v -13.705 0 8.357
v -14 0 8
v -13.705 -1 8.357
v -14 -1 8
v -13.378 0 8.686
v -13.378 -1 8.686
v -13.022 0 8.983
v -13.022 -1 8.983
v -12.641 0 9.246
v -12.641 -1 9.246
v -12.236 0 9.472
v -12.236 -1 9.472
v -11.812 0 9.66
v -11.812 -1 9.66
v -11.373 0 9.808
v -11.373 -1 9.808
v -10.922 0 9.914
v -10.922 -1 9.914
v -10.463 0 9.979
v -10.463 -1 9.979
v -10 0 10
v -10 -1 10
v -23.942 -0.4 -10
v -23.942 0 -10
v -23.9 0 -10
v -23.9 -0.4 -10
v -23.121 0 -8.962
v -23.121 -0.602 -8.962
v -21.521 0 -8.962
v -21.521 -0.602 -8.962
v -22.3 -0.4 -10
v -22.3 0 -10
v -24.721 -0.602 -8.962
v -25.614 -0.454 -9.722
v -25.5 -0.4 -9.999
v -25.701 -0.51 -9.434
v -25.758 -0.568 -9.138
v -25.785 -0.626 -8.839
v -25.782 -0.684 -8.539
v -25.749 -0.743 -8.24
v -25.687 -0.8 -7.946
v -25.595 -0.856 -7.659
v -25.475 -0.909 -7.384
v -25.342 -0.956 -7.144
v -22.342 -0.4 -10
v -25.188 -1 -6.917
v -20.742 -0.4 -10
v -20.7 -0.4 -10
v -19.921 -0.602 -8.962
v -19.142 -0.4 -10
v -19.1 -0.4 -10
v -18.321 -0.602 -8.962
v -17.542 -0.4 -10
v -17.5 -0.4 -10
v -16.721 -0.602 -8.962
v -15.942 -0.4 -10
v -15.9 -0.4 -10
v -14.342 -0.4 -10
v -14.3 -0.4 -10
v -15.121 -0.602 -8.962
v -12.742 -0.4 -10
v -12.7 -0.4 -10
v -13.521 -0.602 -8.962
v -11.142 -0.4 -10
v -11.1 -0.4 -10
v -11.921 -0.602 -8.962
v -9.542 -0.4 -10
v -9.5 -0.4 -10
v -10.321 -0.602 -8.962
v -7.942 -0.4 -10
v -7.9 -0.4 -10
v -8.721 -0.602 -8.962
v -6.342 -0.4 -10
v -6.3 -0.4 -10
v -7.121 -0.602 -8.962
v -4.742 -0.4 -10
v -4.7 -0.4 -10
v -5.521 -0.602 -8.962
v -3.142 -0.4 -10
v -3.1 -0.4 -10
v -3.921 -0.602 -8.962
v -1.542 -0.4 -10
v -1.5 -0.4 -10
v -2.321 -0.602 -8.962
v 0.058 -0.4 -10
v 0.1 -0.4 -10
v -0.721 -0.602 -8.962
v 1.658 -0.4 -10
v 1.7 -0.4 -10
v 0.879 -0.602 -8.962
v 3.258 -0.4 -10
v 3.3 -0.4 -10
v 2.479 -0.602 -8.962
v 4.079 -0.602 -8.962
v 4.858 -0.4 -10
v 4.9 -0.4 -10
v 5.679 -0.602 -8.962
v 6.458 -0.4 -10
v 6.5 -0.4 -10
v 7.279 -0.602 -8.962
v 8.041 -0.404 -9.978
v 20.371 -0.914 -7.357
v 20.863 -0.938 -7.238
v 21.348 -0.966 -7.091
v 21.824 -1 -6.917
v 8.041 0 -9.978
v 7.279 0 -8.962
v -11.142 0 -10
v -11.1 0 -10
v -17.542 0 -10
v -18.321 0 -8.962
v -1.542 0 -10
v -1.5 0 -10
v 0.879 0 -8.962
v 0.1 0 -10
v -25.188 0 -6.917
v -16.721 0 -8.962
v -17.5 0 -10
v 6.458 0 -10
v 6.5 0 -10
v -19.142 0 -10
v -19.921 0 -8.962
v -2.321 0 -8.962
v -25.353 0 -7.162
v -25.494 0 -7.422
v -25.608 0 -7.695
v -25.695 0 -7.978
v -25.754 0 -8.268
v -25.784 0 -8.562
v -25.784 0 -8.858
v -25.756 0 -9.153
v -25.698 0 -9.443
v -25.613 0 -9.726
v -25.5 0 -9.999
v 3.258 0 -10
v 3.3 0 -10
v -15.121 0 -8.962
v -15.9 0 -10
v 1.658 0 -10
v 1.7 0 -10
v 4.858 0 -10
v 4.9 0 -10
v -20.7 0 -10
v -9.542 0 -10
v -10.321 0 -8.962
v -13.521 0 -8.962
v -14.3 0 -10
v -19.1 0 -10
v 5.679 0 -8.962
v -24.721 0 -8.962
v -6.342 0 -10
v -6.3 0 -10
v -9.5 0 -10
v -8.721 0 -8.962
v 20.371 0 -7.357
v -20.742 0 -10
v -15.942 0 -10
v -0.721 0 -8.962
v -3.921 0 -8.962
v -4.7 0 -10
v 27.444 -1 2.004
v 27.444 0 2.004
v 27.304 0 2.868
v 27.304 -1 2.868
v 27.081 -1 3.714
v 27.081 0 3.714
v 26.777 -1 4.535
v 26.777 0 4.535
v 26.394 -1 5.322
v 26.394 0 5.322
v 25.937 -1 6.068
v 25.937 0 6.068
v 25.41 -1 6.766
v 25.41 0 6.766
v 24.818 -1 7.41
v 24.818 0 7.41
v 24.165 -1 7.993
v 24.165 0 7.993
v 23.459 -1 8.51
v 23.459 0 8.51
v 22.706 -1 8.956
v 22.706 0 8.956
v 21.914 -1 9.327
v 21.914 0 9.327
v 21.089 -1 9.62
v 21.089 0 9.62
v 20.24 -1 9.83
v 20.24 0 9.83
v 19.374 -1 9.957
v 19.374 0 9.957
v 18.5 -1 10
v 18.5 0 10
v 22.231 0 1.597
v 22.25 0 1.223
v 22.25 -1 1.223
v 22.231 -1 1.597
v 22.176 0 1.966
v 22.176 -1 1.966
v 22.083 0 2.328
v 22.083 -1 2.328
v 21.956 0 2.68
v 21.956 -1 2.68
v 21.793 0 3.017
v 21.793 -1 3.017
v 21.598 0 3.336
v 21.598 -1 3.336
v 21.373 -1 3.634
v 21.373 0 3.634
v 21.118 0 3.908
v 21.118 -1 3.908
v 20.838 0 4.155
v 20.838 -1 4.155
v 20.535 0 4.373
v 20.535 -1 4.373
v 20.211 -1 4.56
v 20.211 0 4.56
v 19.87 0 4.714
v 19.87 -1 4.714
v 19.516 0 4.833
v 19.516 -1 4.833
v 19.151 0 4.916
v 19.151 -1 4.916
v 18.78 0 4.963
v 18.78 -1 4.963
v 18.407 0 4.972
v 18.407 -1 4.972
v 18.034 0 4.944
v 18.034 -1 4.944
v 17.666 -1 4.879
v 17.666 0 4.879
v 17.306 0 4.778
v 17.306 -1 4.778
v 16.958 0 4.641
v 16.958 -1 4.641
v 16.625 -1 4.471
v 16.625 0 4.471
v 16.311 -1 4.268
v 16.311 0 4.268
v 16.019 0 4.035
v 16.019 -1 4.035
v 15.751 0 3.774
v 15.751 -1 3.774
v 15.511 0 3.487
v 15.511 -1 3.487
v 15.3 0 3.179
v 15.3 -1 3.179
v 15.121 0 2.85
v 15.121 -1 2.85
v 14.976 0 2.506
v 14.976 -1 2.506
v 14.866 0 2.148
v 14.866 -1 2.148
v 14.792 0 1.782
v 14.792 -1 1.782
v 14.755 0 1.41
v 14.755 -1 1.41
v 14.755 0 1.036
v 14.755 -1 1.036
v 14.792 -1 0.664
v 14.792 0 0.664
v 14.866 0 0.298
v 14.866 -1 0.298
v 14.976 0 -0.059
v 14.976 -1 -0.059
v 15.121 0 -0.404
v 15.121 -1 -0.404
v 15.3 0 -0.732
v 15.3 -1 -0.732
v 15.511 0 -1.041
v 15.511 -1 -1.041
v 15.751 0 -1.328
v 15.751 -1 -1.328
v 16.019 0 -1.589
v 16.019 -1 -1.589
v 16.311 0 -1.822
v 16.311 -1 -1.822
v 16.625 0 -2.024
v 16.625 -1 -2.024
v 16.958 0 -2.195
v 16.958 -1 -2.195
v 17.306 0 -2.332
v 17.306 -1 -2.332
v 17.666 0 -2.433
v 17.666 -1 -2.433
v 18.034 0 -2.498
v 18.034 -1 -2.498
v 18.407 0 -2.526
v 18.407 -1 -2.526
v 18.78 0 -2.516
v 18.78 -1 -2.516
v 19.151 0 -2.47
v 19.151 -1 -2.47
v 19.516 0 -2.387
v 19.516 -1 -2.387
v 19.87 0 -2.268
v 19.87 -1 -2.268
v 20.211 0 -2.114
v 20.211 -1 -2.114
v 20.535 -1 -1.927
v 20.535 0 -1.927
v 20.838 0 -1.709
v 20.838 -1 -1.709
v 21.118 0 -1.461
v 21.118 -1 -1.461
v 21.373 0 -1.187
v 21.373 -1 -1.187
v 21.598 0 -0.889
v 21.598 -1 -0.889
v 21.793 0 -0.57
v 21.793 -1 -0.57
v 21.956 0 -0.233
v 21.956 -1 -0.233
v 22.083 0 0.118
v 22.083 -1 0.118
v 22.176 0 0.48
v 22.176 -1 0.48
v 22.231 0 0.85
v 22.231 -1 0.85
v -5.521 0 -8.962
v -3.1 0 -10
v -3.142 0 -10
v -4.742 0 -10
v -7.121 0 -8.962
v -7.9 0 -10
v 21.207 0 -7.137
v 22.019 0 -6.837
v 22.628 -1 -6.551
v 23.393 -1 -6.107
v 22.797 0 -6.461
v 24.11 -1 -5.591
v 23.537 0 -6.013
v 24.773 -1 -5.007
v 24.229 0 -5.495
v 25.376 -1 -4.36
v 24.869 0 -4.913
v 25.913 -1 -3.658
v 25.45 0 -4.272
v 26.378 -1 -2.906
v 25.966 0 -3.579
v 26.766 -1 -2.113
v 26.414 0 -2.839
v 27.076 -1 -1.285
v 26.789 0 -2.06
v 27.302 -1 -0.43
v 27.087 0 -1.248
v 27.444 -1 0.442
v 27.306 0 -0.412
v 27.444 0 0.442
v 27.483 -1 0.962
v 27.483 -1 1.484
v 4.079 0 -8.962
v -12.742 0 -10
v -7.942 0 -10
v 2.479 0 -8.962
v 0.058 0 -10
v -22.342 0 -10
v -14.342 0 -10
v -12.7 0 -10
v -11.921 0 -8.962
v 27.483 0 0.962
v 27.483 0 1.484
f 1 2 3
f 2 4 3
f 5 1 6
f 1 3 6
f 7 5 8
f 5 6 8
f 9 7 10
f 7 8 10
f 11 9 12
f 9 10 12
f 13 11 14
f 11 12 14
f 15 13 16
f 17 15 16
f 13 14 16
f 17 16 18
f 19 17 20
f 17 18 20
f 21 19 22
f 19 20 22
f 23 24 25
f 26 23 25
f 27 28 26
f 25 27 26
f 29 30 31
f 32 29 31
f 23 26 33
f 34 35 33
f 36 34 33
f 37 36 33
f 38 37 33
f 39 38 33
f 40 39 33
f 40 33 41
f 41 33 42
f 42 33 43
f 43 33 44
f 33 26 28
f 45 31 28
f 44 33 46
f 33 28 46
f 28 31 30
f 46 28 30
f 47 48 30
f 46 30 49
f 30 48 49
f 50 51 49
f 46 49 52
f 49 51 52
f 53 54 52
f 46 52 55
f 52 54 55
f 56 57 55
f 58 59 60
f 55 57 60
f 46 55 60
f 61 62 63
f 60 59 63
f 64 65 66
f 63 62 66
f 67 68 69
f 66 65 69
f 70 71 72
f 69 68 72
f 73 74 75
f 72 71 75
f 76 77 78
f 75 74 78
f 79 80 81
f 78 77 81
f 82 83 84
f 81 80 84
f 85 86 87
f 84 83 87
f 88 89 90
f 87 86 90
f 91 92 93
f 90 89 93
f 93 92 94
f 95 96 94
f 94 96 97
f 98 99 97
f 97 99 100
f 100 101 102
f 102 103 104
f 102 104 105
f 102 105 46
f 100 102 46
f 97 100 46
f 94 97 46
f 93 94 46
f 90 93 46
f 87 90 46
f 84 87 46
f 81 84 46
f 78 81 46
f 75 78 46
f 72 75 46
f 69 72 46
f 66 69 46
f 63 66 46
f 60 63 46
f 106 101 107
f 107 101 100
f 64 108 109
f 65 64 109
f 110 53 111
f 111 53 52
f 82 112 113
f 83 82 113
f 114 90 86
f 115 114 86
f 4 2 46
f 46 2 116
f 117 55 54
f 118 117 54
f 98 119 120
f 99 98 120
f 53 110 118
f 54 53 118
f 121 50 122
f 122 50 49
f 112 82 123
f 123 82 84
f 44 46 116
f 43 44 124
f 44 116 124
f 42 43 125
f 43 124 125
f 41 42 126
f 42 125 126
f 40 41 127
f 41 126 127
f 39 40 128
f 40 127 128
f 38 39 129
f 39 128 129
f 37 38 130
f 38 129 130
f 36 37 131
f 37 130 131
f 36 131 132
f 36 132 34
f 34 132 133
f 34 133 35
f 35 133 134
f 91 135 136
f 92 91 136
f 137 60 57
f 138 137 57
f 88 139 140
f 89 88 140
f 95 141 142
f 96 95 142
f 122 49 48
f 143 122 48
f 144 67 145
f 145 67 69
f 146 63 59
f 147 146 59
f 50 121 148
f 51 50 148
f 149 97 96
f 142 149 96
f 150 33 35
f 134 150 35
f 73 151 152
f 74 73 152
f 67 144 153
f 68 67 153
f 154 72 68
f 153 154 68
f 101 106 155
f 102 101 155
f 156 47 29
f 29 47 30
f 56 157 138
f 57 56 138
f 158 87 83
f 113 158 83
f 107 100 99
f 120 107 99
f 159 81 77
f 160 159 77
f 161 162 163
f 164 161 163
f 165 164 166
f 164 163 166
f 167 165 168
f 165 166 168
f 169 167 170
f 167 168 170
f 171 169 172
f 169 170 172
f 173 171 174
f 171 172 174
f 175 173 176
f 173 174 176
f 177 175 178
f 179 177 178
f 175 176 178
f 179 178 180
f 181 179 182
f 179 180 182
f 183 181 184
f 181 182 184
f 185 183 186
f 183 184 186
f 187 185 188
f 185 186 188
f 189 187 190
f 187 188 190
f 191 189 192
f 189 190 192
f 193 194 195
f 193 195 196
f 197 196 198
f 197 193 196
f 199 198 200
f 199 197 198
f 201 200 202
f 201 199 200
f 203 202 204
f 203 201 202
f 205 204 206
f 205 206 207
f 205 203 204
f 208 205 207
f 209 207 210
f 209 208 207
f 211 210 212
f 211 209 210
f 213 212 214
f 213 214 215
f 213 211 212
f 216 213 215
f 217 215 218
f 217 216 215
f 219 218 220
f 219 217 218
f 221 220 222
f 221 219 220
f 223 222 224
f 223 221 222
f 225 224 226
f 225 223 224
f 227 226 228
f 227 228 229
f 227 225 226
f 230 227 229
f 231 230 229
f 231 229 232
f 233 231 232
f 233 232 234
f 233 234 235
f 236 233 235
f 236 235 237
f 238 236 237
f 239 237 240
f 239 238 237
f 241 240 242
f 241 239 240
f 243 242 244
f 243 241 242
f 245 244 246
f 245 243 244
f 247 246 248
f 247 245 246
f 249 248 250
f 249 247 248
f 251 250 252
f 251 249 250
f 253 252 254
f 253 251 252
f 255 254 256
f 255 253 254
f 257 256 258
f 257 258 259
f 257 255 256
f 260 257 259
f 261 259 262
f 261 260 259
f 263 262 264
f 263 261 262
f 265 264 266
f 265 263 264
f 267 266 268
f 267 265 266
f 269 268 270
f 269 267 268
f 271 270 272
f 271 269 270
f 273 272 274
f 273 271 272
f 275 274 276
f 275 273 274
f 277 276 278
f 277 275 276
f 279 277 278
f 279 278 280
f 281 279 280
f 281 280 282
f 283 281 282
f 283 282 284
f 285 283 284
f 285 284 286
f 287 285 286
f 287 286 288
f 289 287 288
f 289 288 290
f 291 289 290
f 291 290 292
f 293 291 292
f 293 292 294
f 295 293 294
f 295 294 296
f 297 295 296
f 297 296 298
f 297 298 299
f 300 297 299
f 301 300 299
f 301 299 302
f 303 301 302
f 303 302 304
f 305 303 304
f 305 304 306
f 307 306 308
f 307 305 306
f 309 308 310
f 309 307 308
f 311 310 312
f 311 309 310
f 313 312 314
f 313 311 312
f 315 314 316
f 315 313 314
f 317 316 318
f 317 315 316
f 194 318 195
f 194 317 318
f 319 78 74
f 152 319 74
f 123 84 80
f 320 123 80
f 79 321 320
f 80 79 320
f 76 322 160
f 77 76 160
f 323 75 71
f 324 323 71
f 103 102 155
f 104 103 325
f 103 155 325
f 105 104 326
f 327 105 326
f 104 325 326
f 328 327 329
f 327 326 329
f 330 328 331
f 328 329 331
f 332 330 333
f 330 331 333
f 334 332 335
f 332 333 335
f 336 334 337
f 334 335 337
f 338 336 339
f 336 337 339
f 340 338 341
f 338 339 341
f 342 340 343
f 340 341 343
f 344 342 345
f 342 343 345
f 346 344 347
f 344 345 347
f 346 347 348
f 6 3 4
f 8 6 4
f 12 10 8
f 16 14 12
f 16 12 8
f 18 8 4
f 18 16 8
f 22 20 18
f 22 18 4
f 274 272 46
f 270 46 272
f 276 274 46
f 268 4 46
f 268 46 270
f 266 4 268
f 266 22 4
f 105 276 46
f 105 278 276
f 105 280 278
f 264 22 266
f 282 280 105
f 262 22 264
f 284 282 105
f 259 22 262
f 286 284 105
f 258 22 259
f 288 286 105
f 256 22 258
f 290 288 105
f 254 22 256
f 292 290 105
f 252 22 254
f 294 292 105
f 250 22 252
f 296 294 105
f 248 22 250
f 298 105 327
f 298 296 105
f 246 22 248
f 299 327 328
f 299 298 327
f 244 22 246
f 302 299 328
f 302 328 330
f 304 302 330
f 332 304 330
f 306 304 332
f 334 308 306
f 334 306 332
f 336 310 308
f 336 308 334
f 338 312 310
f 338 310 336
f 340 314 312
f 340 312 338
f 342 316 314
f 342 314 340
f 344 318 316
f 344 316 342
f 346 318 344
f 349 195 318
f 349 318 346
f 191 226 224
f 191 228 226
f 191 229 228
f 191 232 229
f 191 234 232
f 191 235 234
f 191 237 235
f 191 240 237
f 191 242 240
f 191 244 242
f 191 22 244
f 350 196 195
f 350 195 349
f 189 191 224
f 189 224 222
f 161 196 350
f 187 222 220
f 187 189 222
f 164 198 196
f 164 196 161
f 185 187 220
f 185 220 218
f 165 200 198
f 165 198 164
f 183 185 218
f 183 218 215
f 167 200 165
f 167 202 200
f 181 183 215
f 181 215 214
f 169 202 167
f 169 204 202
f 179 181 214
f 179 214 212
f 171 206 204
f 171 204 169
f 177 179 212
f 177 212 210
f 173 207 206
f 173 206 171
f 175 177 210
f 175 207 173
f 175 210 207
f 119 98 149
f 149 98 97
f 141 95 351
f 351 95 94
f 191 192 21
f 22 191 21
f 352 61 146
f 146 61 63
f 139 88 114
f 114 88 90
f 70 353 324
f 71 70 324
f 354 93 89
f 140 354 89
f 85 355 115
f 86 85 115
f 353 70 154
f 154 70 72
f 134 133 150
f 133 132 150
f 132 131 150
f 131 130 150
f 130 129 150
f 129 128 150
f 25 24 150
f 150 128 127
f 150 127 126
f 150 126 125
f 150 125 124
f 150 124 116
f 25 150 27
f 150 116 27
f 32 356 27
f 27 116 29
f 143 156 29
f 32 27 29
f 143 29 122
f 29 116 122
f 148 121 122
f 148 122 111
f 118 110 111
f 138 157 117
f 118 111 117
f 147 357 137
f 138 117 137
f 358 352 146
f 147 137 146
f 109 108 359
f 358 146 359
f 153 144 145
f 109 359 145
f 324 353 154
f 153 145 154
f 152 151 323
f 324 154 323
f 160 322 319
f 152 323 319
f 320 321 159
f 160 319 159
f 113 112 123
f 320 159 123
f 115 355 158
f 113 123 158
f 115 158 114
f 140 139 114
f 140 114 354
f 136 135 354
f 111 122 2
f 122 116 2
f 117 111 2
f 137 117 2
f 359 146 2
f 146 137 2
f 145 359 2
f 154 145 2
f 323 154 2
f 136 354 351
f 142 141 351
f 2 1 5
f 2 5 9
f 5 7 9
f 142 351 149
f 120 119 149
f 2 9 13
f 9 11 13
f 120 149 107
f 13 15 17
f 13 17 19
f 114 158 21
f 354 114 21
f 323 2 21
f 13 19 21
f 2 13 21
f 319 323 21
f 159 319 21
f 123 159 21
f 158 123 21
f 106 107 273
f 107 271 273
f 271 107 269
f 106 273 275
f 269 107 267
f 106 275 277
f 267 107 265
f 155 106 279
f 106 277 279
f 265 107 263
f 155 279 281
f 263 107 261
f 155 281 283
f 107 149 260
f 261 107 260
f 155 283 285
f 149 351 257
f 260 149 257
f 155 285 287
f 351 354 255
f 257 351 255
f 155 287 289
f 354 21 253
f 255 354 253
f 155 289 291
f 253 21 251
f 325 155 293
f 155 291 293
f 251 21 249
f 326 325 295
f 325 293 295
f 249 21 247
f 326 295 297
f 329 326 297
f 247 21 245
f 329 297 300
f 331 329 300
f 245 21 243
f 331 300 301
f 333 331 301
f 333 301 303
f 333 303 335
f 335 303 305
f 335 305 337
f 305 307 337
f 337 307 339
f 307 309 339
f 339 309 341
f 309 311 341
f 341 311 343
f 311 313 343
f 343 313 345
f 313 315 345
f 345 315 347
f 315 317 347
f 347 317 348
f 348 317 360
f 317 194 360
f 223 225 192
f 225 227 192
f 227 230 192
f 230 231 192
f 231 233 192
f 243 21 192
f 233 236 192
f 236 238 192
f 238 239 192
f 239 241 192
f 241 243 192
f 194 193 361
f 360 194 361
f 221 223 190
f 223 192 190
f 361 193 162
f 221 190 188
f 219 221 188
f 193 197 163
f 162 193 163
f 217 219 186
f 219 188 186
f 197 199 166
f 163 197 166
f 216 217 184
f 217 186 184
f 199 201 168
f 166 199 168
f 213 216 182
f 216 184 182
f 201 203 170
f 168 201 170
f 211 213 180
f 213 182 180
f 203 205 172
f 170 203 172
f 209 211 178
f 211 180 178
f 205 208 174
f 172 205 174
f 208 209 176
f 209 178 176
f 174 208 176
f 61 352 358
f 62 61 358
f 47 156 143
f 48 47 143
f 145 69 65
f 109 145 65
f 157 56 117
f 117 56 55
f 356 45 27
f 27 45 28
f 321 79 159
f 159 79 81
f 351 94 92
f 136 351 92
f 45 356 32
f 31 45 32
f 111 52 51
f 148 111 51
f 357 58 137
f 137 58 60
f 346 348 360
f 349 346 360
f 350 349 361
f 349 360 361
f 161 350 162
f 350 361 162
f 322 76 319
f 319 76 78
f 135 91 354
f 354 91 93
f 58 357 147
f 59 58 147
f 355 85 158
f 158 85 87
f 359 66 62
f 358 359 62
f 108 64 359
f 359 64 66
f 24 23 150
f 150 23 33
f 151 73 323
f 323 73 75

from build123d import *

# Parameters (mm, degrees)
F0_R           = 3.75
F1_DEPTH       = 1
F2_R           = 5
F3_R           = 1
F5_DEPTH       = 25
F7_DEPTH       = 25
F8_T1_DEPTH    = 10.2705098312
F10_DEPTH      = 30
F10_DEPTH_BACK = 25


# Not quite as in the source:
# - a fillet or chamfer that OpenCascade refuses, or shapes differently, is made with other operations: its cross-section is extruded or revolved along the edge and cut away or added


with BuildPart() as f1:
    # F0 (on Front) → F1 (new body)
    with BuildSketch(Plane.XZ):
        with BuildLine():
            Line((-27.5, -10), (7.9370479853, -10))
            Line((7.9370479853, -10), (20.3712052174, -7.3570382915))
            ThreePointArc((20.3712052174, -7.3570382915), (25.1669262461, -4.5995427), (27.4438066413, 0.4421373561))
            ThreePointArc((27.4438066413, 0.4421373561), (27.487512587, 1.2231450576), (27.4438066413, 2.004152759))
            ThreePointArc((27.4438066413, 2.004152759), (24.4984425132, 7.7095966656), (18.5, 10))
            Line((18.5, 10), (-12.5, 10))
            Line((-12.5, 10), (-27.5, -10))
        make_face()
        with Locations((18.5, 1.2231450576)):
            Circle(F0_R, mode=Mode.SUBTRACT)
    extrude(amount=F1_DEPTH)

    # F2
    f2_edges = [f1.edges().sort_by_distance(p)[0] for p in [
        (-12.5, -0.5, 10),
    ]]
    fillet(f2_edges, radius=F2_R)

    # F3
    f3_edges = [f1.edges().sort_by_distance(p)[0] for p in [
        (-27.5, -0.5, -10),
    ]]
    fillet(f3_edges, radius=F3_R)

    # F4 (on face) → F5 (cut)
    with BuildSketch(Plane.XZ.offset(1)):
        Polygon((-24.7211863589, -8.9615818119), (-25.5, -10), (-25.5, -14.0343736857), (7.9370479853, -14.0343736857), (8.0576272821, -10), (7.2788136411, -8.9615818119), (6.5, -10), (6.4576272821, -10), (5.6788136411, -8.9615818119), (4.9, -10), (4.8576272821, -10), (4.0788136411, -8.9615818119), (3.3, -10), (3.2576272821, -10), (2.4788136411, -8.9615818119), (1.7, -10), (1.6576272821, -10), (0.8788136411, -8.9615818119), (0.1, -10), (0.0576272821, -10), (-0.7211863589, -8.9615818119), (-1.5, -10), (-1.5423727179, -10), (-2.3211863589, -8.9615818119), (-3.1, -10), (-3.1423727179, -10), (-3.9211863589, -8.9615818119), (-4.7, -10), (-4.7423727179, -10), (-5.5211863589, -8.9615818119), (-6.3, -10), (-6.3423727179, -10), (-7.1211863589, -8.9615818119), (-7.9, -10), (-7.9423727179, -10), (-8.7211863589, -8.9615818119), (-9.5, -10), (-9.5423727179, -10), (-10.3211863589, -8.9615818119), (-11.1, -10), (-11.1423727179, -10), (-11.9211863589, -8.9615818119), (-12.7, -10), (-12.7423727179, -10), (-13.5211863589, -8.9615818119), (-14.3, -10), (-14.3423727179, -10), (-15.1211863589, -8.9615818119), (-15.9, -10), (-15.9423727179, -10), (-16.7211863589, -8.9615818119), (-17.5, -10), (-17.5423727179, -10), (-18.3211863589, -8.9615818119), (-19.1, -10), (-19.1423727179, -10), (-19.9211863589, -8.9615818119), (-20.7, -10), (-20.7423727179, -10), (-21.5211863589, -8.9615818119), (-22.3, -10), (-22.3423727179, -10), (-23.1211863589, -8.9615818119), (-23.9, -10), (-23.9423727179, -10), align=None)
    extrude(amount=-F5_DEPTH, mode=Mode.SUBTRACT)

    # F6 (on face) → F7 (cut)
    with BuildSketch(Plane.XZ.offset(1)):
        Polygon((-26.6561899334, -14.2840119079), (-25.5, -10), (-26.3, -8.4), (-30.4410159588, -7.8742252663), align=None)
    extrude(amount=-F7_DEPTH, mode=Mode.SUBTRACT)

    # F8: fillet of radius 3 on 1 edges, made by hand

    # F8_s2 → F8_t1 (cut)
    with BuildSketch(Plane.XZ.offset(-4.6352549156)):
        with BuildLine():
            ThreePointArc((-25.1875388203, -6.916718427), (-25.7754167621, -8.4473016411), (-25.4708203932, -10.0583592135))
            Line((-25.4708203932, -10.0583592135), (-26.3, -8.4))
            Line((-26.3, -8.4), (-25.1875388203, -6.916718427))
        make_face()
    extrude(amount=F8_T1_DEPTH, mode=Mode.SUBTRACT)

    # F9 (on Right) → F10 (cut, two sides)
    with BuildSketch(Plane.YZ) as f10_sk:
        Polygon((-2.5567745324, -10.8186043799), (-0.4, -10), (-1, -6.9173601342), (-2.5567745324, -6.9173601342), align=None)
    extrude(amount=-F10_DEPTH, mode=Mode.SUBTRACT)
    extrude(f10_sk.sketch, amount=F10_DEPTH_BACK, mode=Mode.SUBTRACT)


solid = f1.part
